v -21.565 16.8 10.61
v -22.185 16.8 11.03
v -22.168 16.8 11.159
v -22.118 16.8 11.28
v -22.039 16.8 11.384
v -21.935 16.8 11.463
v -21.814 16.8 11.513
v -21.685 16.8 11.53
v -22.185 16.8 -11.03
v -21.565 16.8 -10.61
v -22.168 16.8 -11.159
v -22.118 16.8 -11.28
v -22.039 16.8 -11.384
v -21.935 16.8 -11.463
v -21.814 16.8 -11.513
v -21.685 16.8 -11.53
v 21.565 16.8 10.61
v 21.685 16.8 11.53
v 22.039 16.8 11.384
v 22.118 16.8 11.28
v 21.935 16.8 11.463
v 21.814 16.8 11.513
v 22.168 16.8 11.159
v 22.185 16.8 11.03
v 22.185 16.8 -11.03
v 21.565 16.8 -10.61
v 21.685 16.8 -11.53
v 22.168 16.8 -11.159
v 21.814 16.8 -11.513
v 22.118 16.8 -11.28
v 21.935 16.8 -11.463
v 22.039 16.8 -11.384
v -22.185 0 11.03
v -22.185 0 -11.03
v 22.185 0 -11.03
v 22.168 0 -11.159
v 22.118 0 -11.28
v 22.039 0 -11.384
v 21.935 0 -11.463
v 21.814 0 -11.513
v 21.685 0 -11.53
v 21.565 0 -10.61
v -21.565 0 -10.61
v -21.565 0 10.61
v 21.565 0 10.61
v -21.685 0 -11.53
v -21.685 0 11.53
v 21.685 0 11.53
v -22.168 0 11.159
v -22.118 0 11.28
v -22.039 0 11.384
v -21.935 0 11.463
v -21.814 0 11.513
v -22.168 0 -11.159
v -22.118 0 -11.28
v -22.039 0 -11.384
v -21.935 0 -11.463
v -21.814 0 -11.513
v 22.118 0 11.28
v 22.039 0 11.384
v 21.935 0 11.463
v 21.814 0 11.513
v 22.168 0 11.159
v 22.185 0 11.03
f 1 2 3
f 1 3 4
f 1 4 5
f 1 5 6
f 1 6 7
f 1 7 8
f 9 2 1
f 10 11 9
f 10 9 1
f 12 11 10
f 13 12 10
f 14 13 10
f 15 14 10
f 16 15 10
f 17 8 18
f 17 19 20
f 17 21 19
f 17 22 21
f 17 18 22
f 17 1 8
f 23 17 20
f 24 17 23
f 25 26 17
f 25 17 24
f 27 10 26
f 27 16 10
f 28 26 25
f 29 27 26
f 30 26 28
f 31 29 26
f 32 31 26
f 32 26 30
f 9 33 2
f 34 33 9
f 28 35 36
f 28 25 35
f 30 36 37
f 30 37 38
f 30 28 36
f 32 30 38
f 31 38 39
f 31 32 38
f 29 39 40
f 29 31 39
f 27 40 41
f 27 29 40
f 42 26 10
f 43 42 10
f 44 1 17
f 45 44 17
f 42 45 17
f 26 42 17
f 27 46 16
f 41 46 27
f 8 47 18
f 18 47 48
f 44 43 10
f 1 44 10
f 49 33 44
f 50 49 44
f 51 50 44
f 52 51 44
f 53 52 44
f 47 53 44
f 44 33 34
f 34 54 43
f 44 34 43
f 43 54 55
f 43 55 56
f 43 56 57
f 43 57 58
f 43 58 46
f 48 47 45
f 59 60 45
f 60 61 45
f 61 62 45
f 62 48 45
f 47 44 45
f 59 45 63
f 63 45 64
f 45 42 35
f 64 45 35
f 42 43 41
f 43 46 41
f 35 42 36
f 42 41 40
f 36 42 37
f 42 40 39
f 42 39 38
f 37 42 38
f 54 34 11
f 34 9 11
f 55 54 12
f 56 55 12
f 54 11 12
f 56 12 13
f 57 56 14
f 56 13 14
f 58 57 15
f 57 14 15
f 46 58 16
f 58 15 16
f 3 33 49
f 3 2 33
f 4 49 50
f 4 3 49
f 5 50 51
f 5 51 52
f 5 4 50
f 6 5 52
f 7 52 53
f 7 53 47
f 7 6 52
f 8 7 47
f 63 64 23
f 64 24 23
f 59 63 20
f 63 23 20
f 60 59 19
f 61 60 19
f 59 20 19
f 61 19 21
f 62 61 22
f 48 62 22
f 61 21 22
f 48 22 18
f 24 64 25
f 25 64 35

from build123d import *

# Parameters (mm, degrees)
MIDDLE_COVER_SKETCH_01_W    = 44.37
MIDDLE_COVER_SKETCH_01_H    = 23.06
SALIENTE_EXTRUIR1_DEPTH     = 16.8
VACIADO1_T                  = -1
VACIADO1_THICKNESS_2_FACE_W = 21.06
VACIADO1_THICKNESS_2_FACE_H = 16.8
VACIADO1_THICKNESS_2_DEPTH  = 0.38
VACIADO1_THICKNESS_3_FACE_W = 21.06
VACIADO1_THICKNESS_3_FACE_H = 16.8
VACIADO1_THICKNESS_3_DEPTH  = 0.38
VACIADO1_THICKNESS_4_FACE_W = 43.13
VACIADO1_THICKNESS_4_FACE_H = 16.8
VACIADO1_THICKNESS_4_DEPTH  = 0.08
VACIADO1_THICKNESS_5_FACE_W = 43.13
VACIADO1_THICKNESS_5_FACE_H = 16.8
VACIADO1_THICKNESS_5_DEPTH  = 0.08
REDONDEO1_R                 = 0.5


with BuildPart() as part:
    # Middle-cover-sketch-01 → Saliente-Extruir1 (new body)
    with BuildSketch(Plane(origin=(0, 0, 0), x_dir=(1, 0, 0), z_dir=(0, 1, 0))):
        Rectangle(MIDDLE_COVER_SKETCH_01_W, MIDDLE_COVER_SKETCH_01_H)
    extrude(amount=SALIENTE_EXTRUIR1_DEPTH)

    # Vaciado1
    vaciado1_openings = [part.faces().sort_by_distance(p)[0] for p in [
        (0, 16.8, 0),
        (0, 0, 0),
    ]]
    offset(amount=VACIADO1_T, openings=vaciado1_openings, kind=Kind.INTERSECTION)

    # Vaciado1 thickness 2 face (on inner face of the shell) → Vaciado1 thickness 2 (cut)
    with BuildSketch(Plane(origin=(21.185, 8.4, 0), x_dir=(0, 0, 1), z_dir=(1, 0, 0))):
        Rectangle(VACIADO1_THICKNESS_2_FACE_W, VACIADO1_THICKNESS_2_FACE_H)
    extrude(amount=VACIADO1_THICKNESS_2_DEPTH, mode=Mode.SUBTRACT)

    # Vaciado1 thickness 3 face (on inner face of the shell) → Vaciado1 thickness 3 (cut)
    with BuildSketch(Plane(origin=(-21.185, 8.4, 0), x_dir=(0, 0, -1), z_dir=(-1, 0, 0))):
        Rectangle(VACIADO1_THICKNESS_3_FACE_W, VACIADO1_THICKNESS_3_FACE_H)
    extrude(amount=VACIADO1_THICKNESS_3_DEPTH, mode=Mode.SUBTRACT)

    # Vaciado1 thickness 4 face (on inner face of the shell) → Vaciado1 thickness 4 (cut)
    with BuildSketch(Plane(origin=(0, 8.4, 10.53), x_dir=(1, 0, 0), z_dir=(0, 0, 1))):
        Rectangle(VACIADO1_THICKNESS_4_FACE_W, VACIADO1_THICKNESS_4_FACE_H)
    extrude(amount=VACIADO1_THICKNESS_4_DEPTH, mode=Mode.SUBTRACT)

    # Vaciado1 thickness 5 face (on inner face of the shell) → Vaciado1 thickness 5 (cut)
    with BuildSketch(Plane(origin=(0, 8.4, -10.53), x_dir=(-1, 0, 0), z_dir=(0, 0, -1))):
        Rectangle(VACIADO1_THICKNESS_5_FACE_W, VACIADO1_THICKNESS_5_FACE_H)
    extrude(amount=VACIADO1_THICKNESS_5_DEPTH, mode=Mode.SUBTRACT)

    # Redondeo1
    redondeo1_edges = [part.edges().sort_by_distance(p)[0] for p in [
        (-22.185, 8.4, -11.53),
        (22.185, 8.4, -11.53),
        (22.185, 8.4, 11.53),
        (-22.185, 8.4, 11.53),
    ]]
    fillet(redondeo1_edges, radius=REDONDEO1_R)


solid = part.part
